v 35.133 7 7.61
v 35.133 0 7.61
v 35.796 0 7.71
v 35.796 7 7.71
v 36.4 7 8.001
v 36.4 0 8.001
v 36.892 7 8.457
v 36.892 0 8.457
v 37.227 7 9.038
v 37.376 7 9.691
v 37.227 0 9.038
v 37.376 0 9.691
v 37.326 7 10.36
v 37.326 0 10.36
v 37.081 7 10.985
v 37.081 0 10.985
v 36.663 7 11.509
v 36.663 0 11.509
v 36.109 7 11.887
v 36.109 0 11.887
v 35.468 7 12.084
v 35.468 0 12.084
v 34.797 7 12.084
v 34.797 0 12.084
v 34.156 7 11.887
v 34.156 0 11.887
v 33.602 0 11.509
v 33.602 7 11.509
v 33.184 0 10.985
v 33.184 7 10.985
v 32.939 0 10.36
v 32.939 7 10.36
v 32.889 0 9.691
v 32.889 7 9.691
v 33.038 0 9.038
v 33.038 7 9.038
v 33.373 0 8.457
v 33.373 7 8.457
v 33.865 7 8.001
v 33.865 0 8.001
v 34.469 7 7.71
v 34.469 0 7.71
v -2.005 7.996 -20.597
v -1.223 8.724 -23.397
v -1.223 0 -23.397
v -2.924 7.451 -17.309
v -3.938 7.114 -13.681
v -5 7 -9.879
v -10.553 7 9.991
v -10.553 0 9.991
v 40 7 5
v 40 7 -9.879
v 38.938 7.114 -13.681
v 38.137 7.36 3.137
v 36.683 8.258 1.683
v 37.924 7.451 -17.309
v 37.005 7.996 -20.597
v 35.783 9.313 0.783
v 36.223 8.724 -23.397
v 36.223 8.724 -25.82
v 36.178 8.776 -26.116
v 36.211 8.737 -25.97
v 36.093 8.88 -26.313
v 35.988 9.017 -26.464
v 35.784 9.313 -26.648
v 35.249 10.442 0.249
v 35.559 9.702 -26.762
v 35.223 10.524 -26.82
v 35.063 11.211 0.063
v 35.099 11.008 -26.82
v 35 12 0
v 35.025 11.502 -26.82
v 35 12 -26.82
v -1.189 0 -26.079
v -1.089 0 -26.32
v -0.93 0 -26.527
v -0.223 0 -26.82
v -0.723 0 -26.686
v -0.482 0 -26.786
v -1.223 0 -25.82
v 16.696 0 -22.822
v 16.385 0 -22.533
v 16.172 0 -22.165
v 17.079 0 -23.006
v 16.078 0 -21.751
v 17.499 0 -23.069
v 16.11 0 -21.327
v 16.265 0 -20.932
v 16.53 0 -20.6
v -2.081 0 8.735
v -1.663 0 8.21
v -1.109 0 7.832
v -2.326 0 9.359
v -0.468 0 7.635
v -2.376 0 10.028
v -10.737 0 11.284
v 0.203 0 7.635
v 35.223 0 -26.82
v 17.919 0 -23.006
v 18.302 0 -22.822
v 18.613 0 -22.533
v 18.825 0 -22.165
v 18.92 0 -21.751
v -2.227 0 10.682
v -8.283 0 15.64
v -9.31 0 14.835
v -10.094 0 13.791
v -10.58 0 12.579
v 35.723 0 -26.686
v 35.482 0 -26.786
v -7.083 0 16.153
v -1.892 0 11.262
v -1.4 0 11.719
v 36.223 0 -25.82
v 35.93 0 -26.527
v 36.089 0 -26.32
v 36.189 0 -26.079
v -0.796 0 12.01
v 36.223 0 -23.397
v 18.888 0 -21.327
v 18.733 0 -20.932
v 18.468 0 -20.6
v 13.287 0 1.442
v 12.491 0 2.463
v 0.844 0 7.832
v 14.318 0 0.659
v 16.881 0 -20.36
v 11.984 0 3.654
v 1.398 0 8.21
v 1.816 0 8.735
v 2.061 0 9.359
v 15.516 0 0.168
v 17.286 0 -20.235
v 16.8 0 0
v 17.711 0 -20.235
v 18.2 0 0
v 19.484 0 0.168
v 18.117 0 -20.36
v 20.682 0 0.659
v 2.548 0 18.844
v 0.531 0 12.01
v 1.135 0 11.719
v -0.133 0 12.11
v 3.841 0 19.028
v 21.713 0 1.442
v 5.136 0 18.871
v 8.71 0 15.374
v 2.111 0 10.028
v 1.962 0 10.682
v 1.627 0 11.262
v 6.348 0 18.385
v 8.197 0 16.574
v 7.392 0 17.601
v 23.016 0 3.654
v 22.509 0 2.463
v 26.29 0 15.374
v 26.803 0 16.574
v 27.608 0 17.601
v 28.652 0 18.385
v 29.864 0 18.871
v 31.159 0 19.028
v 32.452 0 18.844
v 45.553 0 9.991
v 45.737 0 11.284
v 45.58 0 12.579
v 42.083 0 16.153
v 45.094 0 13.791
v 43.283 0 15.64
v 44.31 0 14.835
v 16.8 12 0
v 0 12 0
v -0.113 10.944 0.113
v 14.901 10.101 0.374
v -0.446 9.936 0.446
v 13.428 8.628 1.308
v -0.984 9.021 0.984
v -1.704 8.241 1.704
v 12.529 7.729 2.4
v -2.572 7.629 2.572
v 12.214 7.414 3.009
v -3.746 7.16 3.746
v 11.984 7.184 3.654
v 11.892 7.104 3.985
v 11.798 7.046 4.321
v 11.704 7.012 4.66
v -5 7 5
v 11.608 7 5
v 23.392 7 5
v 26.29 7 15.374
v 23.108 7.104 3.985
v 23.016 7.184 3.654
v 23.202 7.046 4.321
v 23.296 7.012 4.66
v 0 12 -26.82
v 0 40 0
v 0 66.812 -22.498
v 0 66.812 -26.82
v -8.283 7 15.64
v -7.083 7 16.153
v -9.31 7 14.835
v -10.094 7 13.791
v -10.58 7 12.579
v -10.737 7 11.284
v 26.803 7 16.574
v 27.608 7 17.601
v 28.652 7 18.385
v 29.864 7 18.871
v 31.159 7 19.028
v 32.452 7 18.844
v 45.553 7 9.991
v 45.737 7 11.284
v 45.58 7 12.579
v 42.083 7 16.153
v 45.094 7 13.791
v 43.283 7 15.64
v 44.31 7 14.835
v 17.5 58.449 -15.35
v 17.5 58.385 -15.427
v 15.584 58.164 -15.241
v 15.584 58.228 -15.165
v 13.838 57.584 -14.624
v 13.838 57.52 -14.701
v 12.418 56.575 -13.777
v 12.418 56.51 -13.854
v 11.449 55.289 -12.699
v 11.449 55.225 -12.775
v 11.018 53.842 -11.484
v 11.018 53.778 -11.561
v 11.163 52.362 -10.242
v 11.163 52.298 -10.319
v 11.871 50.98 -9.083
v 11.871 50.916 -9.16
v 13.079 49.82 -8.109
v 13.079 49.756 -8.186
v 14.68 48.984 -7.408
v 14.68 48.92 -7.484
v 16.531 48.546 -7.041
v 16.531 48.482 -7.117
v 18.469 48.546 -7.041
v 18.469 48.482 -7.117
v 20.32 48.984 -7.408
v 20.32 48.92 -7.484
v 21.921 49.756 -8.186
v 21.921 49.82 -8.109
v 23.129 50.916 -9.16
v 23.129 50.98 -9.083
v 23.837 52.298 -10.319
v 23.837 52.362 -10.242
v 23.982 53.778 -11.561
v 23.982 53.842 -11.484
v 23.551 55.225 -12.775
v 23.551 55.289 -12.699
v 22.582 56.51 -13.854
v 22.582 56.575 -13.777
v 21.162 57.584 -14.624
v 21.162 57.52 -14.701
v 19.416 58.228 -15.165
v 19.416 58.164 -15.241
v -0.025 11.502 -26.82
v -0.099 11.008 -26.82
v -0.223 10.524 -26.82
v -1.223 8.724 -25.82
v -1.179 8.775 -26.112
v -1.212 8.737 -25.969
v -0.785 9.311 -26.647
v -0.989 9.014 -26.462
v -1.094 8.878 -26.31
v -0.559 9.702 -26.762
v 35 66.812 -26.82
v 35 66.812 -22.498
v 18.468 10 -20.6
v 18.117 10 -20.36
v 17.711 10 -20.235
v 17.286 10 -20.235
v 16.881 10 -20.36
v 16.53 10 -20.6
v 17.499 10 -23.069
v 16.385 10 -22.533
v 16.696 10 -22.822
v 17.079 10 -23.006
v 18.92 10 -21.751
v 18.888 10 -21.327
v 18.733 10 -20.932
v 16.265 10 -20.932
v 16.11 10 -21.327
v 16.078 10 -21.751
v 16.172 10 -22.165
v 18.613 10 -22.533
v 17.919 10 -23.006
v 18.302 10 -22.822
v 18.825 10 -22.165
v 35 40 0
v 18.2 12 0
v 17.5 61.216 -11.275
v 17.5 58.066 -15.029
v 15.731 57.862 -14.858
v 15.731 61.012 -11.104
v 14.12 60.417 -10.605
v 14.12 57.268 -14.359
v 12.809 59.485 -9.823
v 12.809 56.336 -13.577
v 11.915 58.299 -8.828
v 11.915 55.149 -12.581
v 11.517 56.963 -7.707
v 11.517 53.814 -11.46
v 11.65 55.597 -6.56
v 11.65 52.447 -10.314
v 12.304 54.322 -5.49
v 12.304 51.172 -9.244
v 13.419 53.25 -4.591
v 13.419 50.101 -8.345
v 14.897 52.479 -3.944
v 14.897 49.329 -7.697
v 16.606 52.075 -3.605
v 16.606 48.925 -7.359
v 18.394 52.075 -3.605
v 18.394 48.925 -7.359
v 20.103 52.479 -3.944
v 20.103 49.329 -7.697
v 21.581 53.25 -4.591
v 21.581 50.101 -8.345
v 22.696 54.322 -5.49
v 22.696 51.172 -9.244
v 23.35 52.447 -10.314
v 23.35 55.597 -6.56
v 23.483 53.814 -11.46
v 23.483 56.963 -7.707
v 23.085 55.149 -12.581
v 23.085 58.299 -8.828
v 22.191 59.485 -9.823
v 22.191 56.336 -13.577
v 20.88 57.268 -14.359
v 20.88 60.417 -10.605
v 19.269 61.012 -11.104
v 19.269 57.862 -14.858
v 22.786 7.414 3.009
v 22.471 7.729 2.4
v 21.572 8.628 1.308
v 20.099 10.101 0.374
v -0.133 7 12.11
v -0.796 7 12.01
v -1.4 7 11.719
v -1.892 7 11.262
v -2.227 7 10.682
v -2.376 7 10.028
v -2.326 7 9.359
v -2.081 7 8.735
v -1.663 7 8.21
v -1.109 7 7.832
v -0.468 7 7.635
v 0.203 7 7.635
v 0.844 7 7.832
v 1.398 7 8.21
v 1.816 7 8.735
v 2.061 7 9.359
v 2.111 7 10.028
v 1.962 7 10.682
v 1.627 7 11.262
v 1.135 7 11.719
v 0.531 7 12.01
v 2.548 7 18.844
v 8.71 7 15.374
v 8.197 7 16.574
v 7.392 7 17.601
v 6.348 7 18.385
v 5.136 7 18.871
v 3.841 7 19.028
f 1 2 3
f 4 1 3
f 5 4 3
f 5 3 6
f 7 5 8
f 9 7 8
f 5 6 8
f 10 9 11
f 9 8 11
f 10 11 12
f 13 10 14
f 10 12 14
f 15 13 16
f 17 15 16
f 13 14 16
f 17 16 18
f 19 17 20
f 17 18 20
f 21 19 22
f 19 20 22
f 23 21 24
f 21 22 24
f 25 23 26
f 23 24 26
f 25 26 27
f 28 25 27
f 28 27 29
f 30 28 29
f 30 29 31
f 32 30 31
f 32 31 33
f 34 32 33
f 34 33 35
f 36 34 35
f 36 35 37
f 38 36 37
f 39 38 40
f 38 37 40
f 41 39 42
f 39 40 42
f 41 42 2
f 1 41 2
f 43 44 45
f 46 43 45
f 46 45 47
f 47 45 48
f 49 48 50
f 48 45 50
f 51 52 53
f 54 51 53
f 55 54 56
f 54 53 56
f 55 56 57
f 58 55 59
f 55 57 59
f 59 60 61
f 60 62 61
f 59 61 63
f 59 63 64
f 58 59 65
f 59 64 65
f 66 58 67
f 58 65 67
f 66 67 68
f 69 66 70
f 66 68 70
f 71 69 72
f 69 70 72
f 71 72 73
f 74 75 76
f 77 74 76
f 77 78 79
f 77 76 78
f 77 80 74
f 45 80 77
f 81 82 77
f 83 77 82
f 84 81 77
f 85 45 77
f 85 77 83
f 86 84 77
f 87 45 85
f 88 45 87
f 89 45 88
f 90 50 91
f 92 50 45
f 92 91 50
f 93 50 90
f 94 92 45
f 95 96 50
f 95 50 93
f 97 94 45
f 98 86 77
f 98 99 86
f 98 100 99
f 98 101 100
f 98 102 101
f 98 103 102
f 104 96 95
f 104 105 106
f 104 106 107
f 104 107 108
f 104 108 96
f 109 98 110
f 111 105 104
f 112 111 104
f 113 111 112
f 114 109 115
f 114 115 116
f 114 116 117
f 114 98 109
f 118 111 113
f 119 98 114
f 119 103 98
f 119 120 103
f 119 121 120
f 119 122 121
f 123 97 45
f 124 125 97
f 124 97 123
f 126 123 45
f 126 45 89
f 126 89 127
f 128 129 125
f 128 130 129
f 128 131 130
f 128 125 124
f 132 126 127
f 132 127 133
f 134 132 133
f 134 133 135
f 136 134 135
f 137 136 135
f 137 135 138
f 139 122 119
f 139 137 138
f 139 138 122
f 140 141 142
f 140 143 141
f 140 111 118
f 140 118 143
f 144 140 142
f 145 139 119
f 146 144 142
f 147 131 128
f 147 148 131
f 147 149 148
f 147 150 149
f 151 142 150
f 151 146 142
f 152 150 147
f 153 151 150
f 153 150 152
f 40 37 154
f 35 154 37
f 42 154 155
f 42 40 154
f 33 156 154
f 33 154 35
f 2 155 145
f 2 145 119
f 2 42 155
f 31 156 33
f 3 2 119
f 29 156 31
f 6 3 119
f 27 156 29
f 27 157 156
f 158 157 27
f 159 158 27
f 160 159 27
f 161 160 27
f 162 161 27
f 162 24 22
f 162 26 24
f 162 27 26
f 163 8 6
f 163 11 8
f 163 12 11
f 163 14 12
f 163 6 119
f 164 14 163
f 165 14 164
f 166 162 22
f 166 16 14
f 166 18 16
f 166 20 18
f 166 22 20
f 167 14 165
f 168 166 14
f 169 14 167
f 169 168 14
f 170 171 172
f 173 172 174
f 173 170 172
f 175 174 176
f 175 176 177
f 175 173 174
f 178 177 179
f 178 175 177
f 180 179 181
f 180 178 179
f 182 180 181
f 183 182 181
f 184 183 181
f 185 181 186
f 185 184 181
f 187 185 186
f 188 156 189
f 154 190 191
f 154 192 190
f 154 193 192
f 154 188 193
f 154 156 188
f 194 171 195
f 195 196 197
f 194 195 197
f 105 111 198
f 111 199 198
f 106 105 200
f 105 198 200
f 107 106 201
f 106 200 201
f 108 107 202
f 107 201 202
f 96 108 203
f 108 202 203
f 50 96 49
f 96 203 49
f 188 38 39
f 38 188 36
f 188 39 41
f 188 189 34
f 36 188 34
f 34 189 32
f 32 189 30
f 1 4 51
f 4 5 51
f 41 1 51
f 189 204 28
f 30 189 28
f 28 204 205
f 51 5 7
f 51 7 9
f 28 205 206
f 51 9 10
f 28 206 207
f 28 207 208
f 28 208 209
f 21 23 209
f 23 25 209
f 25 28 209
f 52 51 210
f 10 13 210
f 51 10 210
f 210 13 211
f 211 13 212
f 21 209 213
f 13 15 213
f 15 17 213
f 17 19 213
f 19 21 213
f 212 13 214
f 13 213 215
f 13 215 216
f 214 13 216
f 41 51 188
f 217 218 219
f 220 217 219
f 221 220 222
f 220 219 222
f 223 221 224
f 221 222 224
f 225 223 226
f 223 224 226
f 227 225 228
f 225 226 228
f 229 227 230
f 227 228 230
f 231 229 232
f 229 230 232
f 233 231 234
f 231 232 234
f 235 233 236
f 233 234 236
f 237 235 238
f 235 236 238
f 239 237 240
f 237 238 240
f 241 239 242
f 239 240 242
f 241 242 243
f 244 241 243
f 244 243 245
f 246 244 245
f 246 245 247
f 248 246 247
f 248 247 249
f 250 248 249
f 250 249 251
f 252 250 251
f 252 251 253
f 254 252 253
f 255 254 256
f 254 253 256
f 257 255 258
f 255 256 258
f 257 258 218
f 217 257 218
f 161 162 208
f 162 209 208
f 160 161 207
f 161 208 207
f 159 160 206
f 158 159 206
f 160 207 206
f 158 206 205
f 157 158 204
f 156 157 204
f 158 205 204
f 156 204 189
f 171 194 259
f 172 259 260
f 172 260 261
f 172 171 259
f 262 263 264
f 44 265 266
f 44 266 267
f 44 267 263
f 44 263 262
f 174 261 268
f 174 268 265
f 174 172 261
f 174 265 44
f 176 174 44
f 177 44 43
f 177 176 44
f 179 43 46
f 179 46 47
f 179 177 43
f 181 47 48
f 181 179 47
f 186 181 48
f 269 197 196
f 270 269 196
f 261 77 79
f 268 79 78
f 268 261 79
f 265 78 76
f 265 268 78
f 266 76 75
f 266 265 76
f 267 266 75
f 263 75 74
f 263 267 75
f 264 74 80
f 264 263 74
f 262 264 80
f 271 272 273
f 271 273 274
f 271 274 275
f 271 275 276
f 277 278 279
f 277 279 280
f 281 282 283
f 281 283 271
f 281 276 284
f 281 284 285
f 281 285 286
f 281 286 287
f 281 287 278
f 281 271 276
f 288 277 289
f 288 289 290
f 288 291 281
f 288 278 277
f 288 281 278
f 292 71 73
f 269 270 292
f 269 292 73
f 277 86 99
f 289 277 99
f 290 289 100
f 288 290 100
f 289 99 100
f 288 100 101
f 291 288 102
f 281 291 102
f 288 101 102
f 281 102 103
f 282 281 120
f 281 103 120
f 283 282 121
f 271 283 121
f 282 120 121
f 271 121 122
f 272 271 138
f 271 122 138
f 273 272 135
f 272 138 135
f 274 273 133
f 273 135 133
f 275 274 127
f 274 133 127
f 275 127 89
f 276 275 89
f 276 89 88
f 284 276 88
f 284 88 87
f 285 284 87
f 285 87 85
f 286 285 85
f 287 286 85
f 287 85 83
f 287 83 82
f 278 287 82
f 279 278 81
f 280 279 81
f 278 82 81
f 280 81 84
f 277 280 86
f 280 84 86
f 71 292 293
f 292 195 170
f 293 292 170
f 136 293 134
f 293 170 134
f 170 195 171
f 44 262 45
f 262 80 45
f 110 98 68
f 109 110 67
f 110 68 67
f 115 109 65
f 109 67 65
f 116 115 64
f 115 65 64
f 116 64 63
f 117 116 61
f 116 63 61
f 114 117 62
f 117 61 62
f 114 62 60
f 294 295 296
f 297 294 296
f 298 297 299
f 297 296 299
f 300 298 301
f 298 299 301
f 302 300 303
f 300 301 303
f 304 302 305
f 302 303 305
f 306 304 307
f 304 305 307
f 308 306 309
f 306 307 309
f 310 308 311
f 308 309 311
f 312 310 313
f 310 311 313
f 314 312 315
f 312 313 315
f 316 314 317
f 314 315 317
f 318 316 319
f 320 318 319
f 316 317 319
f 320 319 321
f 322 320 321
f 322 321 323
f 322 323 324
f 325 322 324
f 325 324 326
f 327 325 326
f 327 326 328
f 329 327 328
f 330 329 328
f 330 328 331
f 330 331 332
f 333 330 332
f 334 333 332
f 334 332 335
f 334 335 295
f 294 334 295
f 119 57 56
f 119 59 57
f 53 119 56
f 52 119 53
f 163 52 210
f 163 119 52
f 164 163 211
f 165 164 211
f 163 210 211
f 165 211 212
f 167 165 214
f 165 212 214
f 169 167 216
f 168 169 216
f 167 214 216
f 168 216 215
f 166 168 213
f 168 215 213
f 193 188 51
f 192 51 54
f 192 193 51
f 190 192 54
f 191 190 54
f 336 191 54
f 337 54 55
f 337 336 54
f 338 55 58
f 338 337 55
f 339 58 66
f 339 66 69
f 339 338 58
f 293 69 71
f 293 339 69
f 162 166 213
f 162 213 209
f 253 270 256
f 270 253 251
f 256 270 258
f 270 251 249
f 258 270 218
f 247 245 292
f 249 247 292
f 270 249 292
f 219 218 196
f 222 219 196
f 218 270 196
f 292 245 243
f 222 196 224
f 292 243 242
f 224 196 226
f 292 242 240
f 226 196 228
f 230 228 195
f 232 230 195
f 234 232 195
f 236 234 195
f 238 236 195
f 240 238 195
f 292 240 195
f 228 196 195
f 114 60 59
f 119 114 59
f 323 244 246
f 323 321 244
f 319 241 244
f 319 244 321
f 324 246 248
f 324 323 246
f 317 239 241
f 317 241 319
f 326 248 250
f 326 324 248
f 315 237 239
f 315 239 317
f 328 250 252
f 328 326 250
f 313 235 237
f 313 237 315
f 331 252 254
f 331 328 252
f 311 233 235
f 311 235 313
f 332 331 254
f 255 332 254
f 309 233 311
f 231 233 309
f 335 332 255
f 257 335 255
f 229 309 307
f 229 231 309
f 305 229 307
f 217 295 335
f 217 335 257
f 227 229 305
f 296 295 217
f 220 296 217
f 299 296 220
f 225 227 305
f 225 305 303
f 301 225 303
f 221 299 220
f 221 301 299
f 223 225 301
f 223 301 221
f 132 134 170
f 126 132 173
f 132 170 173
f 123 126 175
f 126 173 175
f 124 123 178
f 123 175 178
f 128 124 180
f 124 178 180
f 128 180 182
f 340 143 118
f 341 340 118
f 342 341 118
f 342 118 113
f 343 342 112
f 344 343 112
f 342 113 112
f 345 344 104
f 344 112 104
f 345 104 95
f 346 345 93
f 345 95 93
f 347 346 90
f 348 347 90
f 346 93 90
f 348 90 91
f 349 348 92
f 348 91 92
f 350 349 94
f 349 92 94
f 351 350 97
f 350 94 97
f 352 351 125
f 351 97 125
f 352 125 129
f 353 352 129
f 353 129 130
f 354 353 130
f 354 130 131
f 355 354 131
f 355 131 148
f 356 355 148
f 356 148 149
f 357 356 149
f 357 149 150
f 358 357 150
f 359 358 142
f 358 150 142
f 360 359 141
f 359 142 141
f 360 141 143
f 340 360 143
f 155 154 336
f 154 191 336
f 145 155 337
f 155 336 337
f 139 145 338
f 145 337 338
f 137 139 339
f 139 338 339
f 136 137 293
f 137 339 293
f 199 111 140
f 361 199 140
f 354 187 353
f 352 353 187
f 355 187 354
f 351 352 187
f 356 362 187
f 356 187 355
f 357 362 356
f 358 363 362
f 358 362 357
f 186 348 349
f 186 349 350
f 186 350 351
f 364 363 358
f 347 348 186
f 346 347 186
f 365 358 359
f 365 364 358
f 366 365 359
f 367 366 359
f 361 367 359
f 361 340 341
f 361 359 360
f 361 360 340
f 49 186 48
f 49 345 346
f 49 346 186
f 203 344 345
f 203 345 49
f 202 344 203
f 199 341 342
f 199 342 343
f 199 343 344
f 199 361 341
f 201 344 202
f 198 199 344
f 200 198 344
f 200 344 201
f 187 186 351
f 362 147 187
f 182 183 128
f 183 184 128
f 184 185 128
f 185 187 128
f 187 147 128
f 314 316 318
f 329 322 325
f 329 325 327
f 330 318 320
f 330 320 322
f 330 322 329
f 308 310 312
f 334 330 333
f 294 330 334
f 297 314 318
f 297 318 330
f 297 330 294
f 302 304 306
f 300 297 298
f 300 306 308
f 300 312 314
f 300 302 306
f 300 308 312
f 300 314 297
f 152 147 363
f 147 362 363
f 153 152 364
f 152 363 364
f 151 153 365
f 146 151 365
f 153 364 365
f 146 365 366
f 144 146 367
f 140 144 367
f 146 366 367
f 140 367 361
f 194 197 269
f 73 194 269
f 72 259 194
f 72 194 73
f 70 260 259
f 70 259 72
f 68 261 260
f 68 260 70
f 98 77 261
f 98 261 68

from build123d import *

# Parameters (mm, degrees)
AUFSATZ_LINEAR_AUSTRAGEN1_DEPTH = 35
SKIZZE3_R                       = 6
AUFSATZ_LINEAR_AUSTRAGEN2_DEPTH = 5
SKIZZE4_R                       = 6.5
AUFSATZ_LINEAR_AUSTRAGEN3_DEPTH = 0.1
SKIZZE9_R                       = 1.425
SCHNITT_LINEAR_AUSTRAGEN2_DEPTH = 10
SKIZZE10_R                      = 2.25
AUFSATZ_LINEAR_AUSTRAGEN4_DEPTH = 7
VERRUNDUNG1_R                   = 5
VERRUNDUNG2_R                   = 1


with BuildPart() as part:
    # Skizze1 → Aufsatz-Linear austragen1 (new body)
    with BuildSketch(Plane(origin=(0, 0, 0), x_dir=(0, 0, -1), z_dir=(1, 0, 0))):
        Polygon((0, 0), (22.497566339, 0), (26.82, 0), (26.82, 66.811555509), (22.497566339, 66.811555509), (0, 40), align=None)
    extrude(amount=AUFSATZ_LINEAR_AUSTRAGEN1_DEPTH)

    # Skizze3 → Aufsatz-Linear austragen2 (add)
    with BuildSketch(Plane(origin=(0, 16.527036447, 19.69615506), x_dir=(1, 0, 0), z_dir=(0, 0.6427876096865378, 0.7660444431189795))):
        with Locations(Location((17.5, 48.141777725, 0), (0, 0, 90))):
            Circle(SKIZZE3_R)
    extrude(amount=AUFSATZ_LINEAR_AUSTRAGEN2_DEPTH)

    # Skizze4 → Aufsatz-Linear austragen3 (add)
    with BuildSketch(Plane(origin=(0, 16.527036447, 19.69615506), x_dir=(1, 0, 0), z_dir=(0, 0.6427876096865378, 0.7660444431189795))):
        with Locations(Location((17.5, 48.141777725, 0), (0, 0, 90))):
            Circle(SKIZZE4_R)
    extrude(amount=AUFSATZ_LINEAR_AUSTRAGEN3_DEPTH)

    # Skizze9 → Schnitt-Linear austragen2 (cut)
    with BuildSketch(Plane.XZ):
        with Locations(Location((17.498844944, -21.644236877, 0), (0, 0, 270))):
            Circle(SKIZZE9_R)
    extrude(amount=-SCHNITT_LINEAR_AUSTRAGEN2_DEPTH, mode=Mode.SUBTRACT)

    # Skizze10 → Aufsatz-Linear austragen4 (add)
    # profile 1 of 2: a face of its own
    with BuildSketch(Plane.XZ):
        Polygon((35, -26.82), (36.222689888, -26.82), (36.222689888, -23.396698607), (46.898151193, 14.806878364), (27.636053566, 20.189405189), (21.994403466, 0), align=None)
        with Locations(Location((35.132608407, 9.859567437, 0), (0, 0, 270))):
            Circle(SKIZZE10_R, mode=Mode.SUBTRACT)
    # profile 2 of 2: a face of its own
    with BuildSketch(Plane.XZ):
        Polygon((-1.222689888, -26.82), (-1.222689888, -23.396698607), (-11.898151193, 14.806878364), (7.363946434, 20.189405189), (13.005596534, 0), (0, -26.82), align=None)
        with Locations(Location((-0.132608407, 9.859567437, 0), (0, 0, 90))):
            Circle(SKIZZE10_R, mode=Mode.SUBTRACT)
    extrude(amount=-AUFSATZ_LINEAR_AUSTRAGEN4_DEPTH)

    # Verrundung1
    verrundung1_edges = [part.edges().sort_by_distance(p)[0] for p in [
        (6.502798267, 7, 0),
        (28.497201733, 7, 0),
        (35, 7, -13.41),
        (0, 7, -13.41),
        (-11.898151193, 3.5, 14.806878364),
        (7.363946434, 3.5, 20.189405189),
        (46.898151193, 3.5, 14.806878364),
        (27.636053566, 3.5, 20.189405189),
        (21.994403466, 3.5, 0),
        (13.005596534, 3.5, 0),
    ]]
    fillet(verrundung1_edges, radius=VERRUNDUNG1_R)

    # Verrundung2
    verrundung2_edges = [part.edges().sort_by_distance(p)[0] for p in [
        (36.222689888, 4.362018901, -26.82),
        (-1.222689888, 4.362018901, -26.82),
    ]]
    fillet(verrundung2_edges, radius=VERRUNDUNG2_R)


solid = part.part
